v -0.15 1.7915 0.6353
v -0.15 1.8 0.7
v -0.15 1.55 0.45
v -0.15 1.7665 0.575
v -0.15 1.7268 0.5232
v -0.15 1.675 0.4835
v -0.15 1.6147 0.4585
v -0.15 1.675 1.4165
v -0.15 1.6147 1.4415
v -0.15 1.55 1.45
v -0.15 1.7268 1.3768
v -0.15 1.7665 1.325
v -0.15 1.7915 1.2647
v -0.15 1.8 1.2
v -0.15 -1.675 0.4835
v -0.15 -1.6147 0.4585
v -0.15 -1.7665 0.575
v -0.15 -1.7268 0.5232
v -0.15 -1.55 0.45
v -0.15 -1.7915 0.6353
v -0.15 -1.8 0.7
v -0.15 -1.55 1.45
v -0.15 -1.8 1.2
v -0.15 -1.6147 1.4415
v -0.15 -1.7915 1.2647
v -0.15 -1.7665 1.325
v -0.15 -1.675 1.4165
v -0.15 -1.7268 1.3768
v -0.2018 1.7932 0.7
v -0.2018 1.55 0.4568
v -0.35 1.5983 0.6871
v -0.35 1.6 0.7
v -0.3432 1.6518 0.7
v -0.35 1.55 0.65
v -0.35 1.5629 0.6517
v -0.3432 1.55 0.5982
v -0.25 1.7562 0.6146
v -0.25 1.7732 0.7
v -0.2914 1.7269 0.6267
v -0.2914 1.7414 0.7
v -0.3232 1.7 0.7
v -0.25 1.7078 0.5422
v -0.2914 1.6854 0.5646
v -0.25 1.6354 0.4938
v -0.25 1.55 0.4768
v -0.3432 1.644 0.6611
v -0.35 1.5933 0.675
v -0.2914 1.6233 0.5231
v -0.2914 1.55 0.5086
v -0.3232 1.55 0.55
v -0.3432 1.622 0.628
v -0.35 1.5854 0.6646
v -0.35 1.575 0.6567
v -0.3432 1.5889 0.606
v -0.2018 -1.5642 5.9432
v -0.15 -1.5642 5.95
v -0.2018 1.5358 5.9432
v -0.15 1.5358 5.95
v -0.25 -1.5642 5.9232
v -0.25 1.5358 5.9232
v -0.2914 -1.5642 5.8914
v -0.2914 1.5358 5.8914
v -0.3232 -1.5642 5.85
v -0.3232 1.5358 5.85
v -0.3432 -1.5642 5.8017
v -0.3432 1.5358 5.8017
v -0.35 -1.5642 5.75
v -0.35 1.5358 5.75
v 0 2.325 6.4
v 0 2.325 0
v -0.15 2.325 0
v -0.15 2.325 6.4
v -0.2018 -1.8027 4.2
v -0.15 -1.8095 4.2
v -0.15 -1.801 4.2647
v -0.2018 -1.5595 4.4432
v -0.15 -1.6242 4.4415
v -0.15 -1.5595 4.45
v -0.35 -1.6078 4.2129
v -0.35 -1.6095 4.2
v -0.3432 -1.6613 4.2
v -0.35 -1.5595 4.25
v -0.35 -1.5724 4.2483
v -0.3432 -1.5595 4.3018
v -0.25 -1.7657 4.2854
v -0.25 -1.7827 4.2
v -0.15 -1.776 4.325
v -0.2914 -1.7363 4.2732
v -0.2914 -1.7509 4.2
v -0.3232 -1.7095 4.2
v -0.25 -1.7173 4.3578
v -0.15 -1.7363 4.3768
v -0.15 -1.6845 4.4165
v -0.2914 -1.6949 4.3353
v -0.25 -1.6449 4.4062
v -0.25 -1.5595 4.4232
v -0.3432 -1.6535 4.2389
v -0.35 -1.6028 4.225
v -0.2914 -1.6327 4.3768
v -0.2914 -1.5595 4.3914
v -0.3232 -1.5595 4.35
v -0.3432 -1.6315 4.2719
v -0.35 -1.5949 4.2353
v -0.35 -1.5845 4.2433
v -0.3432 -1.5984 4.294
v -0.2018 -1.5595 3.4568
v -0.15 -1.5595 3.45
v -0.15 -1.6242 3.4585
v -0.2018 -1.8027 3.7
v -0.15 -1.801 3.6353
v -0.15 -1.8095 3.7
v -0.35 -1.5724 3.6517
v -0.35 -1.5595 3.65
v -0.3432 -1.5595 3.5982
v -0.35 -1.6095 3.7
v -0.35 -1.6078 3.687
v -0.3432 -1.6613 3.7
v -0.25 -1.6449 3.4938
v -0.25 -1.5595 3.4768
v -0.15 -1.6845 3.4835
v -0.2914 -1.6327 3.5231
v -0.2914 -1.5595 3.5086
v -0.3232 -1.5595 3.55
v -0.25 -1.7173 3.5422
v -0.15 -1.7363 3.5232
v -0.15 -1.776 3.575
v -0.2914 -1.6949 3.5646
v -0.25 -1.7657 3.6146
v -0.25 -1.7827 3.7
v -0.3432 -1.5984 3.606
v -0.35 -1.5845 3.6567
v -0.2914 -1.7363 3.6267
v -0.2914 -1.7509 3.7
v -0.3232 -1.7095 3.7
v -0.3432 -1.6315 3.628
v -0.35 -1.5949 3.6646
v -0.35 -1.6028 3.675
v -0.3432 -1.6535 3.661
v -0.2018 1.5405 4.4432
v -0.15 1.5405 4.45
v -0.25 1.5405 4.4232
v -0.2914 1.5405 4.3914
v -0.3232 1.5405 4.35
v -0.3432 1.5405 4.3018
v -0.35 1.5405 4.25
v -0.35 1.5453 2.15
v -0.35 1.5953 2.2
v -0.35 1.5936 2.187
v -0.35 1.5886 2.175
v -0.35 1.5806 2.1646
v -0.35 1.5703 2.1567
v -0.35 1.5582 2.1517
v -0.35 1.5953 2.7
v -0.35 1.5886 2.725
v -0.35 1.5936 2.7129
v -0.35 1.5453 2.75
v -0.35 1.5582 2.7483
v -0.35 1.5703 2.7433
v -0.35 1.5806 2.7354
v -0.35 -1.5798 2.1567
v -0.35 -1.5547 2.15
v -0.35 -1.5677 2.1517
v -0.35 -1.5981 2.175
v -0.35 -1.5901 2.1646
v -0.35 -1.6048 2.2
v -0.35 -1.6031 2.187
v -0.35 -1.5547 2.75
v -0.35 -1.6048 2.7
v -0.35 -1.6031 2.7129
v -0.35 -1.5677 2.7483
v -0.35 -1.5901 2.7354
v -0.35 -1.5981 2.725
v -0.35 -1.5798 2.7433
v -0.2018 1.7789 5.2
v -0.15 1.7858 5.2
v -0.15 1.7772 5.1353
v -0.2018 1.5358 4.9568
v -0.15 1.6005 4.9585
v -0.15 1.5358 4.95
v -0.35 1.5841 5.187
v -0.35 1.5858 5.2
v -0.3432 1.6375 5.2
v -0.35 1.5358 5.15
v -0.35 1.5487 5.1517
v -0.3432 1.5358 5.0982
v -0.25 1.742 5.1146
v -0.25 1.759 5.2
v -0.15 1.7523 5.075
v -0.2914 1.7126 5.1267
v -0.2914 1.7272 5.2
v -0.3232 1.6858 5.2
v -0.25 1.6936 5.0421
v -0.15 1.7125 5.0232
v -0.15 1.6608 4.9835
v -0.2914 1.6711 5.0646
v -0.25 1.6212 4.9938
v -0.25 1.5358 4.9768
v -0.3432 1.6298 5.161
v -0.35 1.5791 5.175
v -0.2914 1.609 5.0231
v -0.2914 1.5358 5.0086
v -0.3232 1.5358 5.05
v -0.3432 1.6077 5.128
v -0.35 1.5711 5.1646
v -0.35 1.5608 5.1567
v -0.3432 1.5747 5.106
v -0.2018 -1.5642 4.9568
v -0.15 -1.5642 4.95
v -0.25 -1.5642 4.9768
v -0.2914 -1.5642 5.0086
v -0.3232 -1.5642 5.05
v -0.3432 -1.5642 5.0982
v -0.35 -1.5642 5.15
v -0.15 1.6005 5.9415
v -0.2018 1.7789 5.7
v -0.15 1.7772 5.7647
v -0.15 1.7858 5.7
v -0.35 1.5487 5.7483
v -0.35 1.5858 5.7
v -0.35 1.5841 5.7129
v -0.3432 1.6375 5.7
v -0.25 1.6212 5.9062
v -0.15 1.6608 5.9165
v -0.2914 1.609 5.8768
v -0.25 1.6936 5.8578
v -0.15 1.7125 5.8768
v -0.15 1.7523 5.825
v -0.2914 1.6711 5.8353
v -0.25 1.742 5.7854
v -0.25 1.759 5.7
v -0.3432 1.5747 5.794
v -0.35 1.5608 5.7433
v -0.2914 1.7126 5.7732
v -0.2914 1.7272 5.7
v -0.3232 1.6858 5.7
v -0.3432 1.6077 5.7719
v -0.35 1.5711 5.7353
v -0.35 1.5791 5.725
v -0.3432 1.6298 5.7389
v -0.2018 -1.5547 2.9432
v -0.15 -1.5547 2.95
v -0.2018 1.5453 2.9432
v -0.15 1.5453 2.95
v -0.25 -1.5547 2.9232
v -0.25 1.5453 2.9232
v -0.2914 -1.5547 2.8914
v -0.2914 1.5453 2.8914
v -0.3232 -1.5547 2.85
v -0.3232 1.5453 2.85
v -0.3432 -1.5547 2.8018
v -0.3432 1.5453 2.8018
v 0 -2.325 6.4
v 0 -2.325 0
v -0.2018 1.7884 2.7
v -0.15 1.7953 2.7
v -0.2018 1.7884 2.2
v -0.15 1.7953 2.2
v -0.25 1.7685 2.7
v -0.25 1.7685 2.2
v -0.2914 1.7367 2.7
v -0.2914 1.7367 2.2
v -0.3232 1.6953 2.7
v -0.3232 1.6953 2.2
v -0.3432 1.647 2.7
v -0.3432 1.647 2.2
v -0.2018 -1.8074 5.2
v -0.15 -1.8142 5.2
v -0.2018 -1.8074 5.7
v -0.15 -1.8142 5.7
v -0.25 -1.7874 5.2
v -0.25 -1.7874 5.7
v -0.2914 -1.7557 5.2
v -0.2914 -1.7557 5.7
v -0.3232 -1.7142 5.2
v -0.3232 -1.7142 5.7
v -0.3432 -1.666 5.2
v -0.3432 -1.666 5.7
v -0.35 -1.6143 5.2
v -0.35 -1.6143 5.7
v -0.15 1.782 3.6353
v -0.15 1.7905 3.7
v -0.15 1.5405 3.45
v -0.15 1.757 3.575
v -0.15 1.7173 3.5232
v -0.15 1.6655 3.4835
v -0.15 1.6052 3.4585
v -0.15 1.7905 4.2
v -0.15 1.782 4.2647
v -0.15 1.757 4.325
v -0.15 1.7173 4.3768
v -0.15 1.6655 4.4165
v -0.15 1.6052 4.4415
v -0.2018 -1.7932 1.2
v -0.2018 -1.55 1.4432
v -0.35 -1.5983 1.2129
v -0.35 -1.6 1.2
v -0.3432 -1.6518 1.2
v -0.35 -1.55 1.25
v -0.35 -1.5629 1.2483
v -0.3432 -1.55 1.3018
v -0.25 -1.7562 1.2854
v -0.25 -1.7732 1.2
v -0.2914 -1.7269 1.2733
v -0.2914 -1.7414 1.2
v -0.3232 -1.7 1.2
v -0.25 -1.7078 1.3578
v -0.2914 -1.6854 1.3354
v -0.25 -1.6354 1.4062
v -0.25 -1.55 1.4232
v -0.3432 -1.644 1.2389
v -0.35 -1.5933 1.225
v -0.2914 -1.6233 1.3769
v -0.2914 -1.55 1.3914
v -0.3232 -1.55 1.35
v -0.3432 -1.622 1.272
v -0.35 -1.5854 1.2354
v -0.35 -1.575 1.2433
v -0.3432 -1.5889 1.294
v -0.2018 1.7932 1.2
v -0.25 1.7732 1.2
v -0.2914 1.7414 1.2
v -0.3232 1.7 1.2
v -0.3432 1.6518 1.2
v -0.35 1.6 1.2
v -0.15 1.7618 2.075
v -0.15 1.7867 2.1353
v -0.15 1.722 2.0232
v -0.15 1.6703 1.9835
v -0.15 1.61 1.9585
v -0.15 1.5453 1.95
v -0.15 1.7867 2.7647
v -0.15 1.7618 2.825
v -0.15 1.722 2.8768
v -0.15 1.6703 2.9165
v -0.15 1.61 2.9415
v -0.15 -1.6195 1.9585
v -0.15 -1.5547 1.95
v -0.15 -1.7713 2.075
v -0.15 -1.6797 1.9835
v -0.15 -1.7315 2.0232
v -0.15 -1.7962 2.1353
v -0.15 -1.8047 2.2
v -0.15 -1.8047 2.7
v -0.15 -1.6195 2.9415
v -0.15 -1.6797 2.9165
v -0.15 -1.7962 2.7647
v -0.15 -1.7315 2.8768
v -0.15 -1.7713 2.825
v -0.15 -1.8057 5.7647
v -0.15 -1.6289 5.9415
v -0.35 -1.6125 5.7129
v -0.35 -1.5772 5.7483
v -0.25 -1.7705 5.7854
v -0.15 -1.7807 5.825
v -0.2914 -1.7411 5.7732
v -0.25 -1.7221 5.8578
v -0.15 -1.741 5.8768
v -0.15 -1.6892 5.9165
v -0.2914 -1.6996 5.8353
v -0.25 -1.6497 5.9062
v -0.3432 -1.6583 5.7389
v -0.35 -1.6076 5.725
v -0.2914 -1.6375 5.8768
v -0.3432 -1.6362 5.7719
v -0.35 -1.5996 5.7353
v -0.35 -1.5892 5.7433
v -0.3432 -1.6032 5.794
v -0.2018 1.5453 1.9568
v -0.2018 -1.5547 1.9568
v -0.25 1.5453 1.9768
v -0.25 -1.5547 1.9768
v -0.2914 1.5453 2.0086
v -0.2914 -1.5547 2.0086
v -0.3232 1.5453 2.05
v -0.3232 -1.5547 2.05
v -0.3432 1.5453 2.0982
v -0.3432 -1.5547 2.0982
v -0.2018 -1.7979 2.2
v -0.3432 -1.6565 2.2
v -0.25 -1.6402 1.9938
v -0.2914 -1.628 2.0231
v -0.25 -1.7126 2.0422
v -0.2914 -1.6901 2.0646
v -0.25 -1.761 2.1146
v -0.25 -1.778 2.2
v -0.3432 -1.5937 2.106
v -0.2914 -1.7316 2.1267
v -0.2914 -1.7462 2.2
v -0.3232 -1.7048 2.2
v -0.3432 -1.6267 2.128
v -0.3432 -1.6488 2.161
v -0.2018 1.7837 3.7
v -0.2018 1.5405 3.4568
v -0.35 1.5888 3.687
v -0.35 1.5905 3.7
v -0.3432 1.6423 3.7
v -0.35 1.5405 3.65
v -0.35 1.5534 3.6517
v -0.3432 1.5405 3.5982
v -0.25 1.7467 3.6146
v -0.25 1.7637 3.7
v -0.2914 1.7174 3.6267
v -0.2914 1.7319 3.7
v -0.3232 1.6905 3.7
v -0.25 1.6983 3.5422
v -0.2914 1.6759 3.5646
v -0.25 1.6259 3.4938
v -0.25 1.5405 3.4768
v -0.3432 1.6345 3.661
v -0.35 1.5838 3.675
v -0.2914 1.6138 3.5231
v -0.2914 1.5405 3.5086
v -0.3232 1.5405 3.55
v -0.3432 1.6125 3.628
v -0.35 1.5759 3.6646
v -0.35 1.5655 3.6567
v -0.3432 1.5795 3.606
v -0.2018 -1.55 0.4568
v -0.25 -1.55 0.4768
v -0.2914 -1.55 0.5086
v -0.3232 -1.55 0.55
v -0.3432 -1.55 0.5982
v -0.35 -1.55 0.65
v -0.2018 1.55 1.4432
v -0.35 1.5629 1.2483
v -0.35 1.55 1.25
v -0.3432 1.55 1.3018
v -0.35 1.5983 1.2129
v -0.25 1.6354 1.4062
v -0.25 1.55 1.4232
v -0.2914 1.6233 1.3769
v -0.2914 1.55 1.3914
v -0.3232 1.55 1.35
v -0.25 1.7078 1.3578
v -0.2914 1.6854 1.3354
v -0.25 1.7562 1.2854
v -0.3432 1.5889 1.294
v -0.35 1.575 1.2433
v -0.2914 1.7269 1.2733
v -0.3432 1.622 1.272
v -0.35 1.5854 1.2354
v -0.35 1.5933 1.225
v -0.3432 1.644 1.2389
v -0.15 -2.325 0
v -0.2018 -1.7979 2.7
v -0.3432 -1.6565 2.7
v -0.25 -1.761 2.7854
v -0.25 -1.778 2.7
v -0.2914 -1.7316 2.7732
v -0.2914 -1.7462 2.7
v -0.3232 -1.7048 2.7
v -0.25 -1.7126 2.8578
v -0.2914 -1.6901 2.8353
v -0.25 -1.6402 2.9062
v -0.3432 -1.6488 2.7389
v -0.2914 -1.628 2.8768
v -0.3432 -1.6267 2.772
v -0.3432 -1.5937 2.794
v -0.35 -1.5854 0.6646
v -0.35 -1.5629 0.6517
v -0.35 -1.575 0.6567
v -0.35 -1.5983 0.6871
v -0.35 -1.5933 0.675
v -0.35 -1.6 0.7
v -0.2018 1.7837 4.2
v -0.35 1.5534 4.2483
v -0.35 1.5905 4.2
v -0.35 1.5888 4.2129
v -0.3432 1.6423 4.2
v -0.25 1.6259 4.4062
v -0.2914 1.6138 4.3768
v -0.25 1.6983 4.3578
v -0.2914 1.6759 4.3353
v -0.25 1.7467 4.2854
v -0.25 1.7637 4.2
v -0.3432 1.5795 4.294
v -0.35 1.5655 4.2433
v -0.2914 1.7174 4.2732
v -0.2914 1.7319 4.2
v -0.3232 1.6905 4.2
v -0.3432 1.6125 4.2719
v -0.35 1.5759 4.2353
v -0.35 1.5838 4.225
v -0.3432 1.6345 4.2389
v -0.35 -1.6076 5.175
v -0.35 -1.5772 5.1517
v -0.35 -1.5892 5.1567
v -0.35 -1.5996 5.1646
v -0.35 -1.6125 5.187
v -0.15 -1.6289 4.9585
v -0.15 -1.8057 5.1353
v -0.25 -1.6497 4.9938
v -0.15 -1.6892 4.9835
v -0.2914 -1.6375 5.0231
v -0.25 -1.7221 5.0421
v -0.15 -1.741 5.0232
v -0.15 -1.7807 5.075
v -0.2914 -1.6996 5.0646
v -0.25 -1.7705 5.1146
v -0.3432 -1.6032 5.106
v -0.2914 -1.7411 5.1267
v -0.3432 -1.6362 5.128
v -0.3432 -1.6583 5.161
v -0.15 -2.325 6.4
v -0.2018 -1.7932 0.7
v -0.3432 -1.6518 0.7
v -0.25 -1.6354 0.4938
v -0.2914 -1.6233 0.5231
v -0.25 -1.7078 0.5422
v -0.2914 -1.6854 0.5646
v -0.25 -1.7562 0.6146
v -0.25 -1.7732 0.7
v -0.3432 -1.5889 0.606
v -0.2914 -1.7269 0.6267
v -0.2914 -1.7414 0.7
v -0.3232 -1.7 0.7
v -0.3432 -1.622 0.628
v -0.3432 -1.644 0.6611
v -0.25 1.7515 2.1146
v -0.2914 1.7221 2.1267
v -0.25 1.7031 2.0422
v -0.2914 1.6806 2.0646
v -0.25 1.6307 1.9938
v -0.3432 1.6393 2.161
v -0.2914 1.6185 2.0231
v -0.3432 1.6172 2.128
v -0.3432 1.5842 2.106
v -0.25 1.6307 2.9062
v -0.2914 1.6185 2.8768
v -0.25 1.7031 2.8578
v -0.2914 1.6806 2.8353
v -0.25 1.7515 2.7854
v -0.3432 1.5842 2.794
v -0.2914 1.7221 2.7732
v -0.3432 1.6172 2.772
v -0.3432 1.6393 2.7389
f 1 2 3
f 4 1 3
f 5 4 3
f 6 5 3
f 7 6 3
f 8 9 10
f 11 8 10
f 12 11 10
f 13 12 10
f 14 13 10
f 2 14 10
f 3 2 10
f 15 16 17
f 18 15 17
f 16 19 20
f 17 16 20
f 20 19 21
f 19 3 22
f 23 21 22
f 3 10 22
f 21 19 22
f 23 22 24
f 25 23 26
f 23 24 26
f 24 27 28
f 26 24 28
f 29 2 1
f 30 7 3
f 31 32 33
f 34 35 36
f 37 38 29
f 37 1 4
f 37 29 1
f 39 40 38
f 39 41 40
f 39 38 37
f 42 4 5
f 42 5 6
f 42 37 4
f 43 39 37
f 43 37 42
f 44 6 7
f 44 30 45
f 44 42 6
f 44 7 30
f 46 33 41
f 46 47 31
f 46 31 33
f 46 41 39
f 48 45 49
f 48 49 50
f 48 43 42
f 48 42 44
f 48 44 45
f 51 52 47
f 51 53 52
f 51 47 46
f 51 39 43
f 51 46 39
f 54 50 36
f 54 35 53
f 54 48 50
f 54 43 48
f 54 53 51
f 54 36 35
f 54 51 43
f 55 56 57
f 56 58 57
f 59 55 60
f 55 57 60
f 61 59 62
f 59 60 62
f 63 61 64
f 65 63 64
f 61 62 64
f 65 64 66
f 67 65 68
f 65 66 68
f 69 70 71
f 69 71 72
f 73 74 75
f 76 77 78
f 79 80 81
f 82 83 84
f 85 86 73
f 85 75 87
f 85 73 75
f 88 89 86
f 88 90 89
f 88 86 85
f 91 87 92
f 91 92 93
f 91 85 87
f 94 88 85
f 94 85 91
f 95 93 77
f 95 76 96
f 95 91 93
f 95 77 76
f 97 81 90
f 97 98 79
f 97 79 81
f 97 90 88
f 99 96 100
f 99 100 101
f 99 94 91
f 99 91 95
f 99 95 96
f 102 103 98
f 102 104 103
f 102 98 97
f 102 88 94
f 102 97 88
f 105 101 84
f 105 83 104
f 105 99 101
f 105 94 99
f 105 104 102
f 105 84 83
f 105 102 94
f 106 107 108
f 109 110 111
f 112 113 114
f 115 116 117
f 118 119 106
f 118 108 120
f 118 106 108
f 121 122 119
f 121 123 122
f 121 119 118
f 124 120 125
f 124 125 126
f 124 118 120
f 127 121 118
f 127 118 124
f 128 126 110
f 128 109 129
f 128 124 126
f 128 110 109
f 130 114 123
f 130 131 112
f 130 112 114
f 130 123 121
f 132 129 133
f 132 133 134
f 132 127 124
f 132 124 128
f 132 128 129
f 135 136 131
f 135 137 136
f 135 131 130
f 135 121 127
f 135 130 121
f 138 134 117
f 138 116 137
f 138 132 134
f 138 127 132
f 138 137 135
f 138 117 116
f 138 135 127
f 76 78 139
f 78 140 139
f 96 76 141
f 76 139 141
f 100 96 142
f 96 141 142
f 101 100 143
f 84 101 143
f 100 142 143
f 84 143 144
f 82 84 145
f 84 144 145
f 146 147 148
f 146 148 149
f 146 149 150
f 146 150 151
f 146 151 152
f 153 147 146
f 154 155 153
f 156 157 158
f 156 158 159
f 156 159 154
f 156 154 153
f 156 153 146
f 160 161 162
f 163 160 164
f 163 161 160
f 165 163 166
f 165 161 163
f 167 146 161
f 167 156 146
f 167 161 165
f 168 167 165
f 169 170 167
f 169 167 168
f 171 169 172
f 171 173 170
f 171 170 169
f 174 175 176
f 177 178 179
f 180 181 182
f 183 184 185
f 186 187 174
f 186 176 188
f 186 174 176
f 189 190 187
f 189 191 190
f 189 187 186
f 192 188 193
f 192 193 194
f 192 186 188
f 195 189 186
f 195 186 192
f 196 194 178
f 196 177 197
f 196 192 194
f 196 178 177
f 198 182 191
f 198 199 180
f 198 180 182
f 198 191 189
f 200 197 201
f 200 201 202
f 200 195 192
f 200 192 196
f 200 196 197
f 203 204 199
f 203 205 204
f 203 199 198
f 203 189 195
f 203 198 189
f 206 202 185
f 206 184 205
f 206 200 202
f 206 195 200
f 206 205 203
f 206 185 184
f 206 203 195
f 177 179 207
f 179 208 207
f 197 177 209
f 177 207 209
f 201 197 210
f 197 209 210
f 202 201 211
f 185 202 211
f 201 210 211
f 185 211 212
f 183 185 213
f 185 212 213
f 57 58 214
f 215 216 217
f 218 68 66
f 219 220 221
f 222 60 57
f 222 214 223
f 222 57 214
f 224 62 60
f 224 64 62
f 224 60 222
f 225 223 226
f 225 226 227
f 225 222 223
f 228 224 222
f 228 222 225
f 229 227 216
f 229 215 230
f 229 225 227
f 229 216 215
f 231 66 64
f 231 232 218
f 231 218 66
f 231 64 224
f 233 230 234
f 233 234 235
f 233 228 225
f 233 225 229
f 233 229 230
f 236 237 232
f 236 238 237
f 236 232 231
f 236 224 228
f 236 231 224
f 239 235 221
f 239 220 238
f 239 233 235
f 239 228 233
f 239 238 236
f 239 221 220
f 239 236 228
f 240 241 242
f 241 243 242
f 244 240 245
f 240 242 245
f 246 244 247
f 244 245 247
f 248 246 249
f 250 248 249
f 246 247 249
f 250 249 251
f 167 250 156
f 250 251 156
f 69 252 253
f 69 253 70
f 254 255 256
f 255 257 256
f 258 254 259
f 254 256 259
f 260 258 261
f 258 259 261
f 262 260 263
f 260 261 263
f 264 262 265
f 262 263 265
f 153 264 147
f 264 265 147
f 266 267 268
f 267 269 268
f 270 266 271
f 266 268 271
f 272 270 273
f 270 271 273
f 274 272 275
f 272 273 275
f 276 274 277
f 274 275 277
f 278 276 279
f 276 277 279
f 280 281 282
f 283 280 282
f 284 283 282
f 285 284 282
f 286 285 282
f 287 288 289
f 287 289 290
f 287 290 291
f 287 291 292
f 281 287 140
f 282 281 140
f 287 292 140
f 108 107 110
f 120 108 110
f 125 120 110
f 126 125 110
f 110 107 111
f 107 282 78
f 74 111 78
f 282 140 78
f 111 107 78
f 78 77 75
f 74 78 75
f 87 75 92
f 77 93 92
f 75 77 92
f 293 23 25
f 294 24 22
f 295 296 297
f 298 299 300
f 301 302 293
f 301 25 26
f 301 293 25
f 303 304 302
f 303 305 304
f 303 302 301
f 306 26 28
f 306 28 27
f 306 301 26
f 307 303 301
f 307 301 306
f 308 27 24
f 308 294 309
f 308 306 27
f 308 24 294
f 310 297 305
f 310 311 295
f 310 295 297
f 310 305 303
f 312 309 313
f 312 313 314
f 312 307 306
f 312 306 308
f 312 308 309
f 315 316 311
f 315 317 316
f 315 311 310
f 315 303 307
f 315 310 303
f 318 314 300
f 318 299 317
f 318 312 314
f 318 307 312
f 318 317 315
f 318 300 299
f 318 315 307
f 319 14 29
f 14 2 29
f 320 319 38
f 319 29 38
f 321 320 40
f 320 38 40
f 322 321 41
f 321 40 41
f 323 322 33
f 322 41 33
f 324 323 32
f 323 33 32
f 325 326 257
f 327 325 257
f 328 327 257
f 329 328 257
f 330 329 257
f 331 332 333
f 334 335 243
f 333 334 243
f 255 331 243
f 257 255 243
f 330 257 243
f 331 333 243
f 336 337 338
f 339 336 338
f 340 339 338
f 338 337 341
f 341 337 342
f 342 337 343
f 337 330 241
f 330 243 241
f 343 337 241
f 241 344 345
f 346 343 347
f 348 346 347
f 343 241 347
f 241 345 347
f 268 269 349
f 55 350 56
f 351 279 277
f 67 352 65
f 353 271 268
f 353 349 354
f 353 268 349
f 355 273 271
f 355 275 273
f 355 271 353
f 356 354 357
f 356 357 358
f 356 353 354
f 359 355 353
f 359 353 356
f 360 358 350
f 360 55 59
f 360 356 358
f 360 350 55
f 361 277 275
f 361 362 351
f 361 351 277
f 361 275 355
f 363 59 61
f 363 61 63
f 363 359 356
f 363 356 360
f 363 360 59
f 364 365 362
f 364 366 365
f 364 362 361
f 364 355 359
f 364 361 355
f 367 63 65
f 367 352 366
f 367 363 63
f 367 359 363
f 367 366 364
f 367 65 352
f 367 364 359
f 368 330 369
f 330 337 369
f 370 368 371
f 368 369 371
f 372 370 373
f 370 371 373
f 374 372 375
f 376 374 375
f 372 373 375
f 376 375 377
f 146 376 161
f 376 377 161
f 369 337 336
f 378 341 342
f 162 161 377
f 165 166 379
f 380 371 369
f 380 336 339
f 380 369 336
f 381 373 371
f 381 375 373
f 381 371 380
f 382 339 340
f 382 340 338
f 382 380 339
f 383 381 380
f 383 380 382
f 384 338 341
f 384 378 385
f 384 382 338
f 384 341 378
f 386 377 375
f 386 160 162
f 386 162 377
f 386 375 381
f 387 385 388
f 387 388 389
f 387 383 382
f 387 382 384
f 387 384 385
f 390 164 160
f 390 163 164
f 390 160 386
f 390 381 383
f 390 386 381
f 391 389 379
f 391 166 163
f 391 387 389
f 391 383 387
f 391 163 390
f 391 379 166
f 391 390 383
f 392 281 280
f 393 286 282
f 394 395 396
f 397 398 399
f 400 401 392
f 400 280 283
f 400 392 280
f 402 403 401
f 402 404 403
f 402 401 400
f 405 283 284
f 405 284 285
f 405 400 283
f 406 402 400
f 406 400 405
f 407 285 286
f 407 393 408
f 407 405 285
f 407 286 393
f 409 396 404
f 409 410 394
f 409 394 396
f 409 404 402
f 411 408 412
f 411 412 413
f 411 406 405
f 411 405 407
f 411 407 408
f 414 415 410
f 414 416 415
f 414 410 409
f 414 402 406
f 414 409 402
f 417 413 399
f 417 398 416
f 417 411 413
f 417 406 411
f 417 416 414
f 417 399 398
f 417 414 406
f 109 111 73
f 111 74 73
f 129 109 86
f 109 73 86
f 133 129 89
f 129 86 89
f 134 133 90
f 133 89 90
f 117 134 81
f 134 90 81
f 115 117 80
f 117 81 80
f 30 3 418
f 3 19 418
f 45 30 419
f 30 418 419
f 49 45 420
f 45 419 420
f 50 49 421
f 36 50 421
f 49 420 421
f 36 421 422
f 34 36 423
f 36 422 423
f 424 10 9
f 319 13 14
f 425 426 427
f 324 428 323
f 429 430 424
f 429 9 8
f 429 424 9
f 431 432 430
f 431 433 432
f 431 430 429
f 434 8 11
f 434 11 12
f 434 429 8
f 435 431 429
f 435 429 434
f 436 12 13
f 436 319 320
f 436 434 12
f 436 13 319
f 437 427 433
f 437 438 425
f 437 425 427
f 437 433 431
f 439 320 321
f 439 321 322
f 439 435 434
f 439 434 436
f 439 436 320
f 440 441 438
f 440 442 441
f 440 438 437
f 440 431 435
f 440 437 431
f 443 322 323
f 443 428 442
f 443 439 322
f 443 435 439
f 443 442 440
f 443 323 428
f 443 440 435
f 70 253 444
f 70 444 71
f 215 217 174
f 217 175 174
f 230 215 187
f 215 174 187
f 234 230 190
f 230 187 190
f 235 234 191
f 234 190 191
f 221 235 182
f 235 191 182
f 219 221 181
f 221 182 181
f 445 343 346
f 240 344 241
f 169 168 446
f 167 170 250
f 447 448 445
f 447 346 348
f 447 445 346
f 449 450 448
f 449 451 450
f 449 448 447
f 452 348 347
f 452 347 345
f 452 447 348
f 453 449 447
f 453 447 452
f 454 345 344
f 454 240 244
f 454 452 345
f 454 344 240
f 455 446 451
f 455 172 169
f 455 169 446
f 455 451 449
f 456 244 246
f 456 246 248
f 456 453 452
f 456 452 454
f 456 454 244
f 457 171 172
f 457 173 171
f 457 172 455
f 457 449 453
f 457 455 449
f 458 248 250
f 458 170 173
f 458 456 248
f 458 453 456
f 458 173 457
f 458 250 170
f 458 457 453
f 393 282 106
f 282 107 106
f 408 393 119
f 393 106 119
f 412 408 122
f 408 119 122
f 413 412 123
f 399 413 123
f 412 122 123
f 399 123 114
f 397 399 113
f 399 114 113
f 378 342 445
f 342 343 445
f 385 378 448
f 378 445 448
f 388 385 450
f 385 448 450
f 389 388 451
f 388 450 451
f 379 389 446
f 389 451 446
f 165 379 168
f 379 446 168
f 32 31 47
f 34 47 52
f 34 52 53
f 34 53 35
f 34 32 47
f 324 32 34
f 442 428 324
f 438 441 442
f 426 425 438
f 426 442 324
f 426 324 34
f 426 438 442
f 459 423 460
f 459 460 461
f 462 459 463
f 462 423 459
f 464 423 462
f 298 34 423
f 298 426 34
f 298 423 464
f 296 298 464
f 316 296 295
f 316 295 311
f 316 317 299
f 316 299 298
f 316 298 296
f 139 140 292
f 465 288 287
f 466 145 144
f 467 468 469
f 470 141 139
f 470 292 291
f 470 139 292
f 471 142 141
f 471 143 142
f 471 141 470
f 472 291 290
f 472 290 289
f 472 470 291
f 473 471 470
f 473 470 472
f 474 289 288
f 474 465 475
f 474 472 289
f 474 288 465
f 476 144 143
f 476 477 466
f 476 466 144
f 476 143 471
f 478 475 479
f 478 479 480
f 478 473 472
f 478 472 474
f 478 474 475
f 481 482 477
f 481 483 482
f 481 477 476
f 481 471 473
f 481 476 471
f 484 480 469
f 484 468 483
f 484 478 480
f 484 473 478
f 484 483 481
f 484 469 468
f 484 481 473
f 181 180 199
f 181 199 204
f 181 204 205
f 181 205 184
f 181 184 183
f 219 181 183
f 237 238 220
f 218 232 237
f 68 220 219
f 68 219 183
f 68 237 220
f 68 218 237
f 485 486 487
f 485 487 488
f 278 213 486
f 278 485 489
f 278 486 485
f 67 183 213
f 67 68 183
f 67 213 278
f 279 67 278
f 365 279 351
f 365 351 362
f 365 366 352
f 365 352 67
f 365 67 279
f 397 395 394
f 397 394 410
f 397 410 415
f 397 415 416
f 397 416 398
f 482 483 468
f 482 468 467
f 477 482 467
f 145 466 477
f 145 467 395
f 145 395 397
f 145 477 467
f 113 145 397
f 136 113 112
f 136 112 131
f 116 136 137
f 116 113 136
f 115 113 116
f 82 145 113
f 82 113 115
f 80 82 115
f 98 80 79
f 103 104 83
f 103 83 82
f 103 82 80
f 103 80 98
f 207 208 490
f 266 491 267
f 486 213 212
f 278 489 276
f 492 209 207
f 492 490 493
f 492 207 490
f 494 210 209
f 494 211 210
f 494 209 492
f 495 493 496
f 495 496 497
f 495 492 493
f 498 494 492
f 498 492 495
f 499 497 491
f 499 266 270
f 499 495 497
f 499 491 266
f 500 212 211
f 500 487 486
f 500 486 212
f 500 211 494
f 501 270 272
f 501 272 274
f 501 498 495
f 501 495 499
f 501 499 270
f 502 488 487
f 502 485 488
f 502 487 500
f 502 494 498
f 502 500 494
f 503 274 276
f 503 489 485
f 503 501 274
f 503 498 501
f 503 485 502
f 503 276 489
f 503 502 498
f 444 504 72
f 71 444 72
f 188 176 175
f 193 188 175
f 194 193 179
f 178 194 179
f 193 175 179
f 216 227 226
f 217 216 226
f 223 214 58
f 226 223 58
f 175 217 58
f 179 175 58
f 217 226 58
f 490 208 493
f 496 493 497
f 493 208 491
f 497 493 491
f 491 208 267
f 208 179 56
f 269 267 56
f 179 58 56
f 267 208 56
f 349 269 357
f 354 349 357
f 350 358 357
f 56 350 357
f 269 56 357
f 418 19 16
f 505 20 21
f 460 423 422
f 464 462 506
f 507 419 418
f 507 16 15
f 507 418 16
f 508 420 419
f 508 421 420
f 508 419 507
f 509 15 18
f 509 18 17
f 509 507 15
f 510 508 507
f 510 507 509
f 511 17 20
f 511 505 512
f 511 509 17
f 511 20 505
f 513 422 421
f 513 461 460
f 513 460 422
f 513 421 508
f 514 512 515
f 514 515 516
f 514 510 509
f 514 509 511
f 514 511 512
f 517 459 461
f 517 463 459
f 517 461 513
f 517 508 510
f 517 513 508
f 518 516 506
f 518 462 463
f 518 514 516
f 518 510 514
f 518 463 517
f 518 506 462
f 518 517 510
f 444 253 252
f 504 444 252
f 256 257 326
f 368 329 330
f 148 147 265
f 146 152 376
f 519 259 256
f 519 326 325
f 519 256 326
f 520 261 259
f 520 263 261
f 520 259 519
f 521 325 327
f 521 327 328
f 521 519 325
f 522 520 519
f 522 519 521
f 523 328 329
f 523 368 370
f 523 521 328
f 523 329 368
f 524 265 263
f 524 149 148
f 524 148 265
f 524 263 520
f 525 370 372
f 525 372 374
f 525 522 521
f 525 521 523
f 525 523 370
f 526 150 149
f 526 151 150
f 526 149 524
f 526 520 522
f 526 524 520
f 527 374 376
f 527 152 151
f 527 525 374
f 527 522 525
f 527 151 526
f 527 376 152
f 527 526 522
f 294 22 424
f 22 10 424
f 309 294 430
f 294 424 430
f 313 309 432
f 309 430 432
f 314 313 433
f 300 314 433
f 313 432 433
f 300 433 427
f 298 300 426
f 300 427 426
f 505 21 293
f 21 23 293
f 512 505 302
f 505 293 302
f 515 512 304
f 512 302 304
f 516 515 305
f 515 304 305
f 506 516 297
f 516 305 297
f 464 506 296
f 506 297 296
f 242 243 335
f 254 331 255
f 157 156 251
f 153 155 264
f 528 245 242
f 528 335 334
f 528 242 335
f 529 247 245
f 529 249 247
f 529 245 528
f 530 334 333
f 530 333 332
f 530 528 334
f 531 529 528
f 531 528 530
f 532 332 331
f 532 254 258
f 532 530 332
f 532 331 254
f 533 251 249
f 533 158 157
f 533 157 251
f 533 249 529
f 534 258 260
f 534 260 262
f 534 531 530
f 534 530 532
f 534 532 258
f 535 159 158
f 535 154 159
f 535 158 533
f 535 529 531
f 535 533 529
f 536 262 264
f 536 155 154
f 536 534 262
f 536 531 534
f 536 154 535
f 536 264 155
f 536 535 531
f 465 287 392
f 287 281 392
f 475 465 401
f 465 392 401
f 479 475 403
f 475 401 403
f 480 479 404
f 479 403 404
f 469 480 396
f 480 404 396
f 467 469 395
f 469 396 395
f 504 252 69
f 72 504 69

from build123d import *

# Parameters (mm, degrees)
F0_W     = 4.65
F0_H     = 6.4
F1_DEPTH = 0.15
F3_DEPTH = 0.2
F4_R     = 0.19999
F4_2_R   = 0.19999
F4_3_R   = 0.19999
F4_4_R   = 0.19999


# Not quite as in the source:
# - a fillet or chamfer is up to 0.001 mm smaller than in the source, because OpenCascade refuses the exact size


with BuildPart() as f1:
    # F0 (on Right) → F1 (new body)
    with BuildSketch(Plane.YZ):
        with Locations((0, 3.2)):
            Rectangle(F0_W, F0_H)
    extrude(amount=-F1_DEPTH)


with BuildPart() as f3:
    # F2 (on face) → F3 (new body)
    with BuildSketch(Plane(origin=(-0.15, 0, 0), x_dir=(0, -1, 0), z_dir=(-1, 0, 0))):
        with BuildLine():
            Line((-1.55, 0.45), (1.55, 0.45))
            ThreePointArc((1.55, 0.45), (1.7267766953, 0.5232233047), (1.8, 0.7))
            Line((1.8, 0.7), (1.8, 1.2))
            ThreePointArc((1.8, 1.2), (1.7267766953, 1.3767766953), (1.55, 1.45))
            Line((1.55, 1.45), (-1.55, 1.45))
            ThreePointArc((-1.55, 1.45), (-1.7267766953, 1.3767766953), (-1.8, 1.2))
            Line((-1.8, 1.2), (-1.8, 0.7))
            ThreePointArc((-1.8, 0.7), (-1.7267766953, 0.5232233047), (-1.55, 0.45))
        make_face()
    extrude(amount=F3_DEPTH)

    # F4#4 (radius 0.2 in the source; OpenCascade refuses exactly that, so slightly less here)
    f4_4_edges = [f3.edges().sort_by_distance(p)[0] for p in [
        (-0.35, 0, 0.45),
        (-0.35, -1.726777, 0.523223),
        (-0.35, -1.8, 0.95),
        (-0.35, -1.726777, 1.376777),
        (-0.35, 0, 1.45),
        (-0.35, 1.726777, 1.376777),
        (-0.35, 1.8, 0.95),
        (-0.35, 1.726777, 0.523223),
    ]]
    fillet(f4_4_edges, radius=F4_4_R)


with BuildPart() as f3b:
    # F2 (on face) → F3, piece 2 (new body)
    with BuildSketch(Plane(origin=(-0.15, 0, 0), x_dir=(0, -1, 0), z_dir=(-1, 0, 0))):
        with BuildLine():
            Line((-1.5452531883, 1.9499924892), (1.5547468117, 1.9499924892))
            ThreePointArc((1.5547468117, 1.9499924892), (1.731523507, 2.0232157939), (1.8047468117, 2.1999924892))
            Line((1.8047468117, 2.1999924892), (1.8047468117, 2.6999924892))
            ThreePointArc((1.8047468117, 2.6999924892), (1.731523507, 2.8767691845), (1.5547468117, 2.9499924892))
            Line((1.5547468117, 2.9499924892), (-1.5452531883, 2.9499924892))
            ThreePointArc((-1.5452531883, 2.9499924892), (-1.7220298836, 2.8767691845), (-1.7952531883, 2.6999924892))
            Line((-1.7952531883, 2.6999924892), (-1.7952531883, 2.1999924892))
            ThreePointArc((-1.7952531883, 2.1999924892), (-1.7220298836, 2.0232157939), (-1.5452531883, 1.9499924892))
        make_face()
    extrude(amount=F3_DEPTH)

    # F4#3 (radius 0.2 in the source; OpenCascade refuses exactly that, so slightly less here)
    f4_3_edges = [f3b.edges().sort_by_distance(p)[0] for p in [
        (-0.35, 1.72203, 2.023216),
        (-0.35, -0.004747, 1.949992),
        (-0.35, -1.731524, 2.023216),
        (-0.35, -1.804747, 2.449992),
        (-0.35, -1.731524, 2.876769),
        (-0.35, -0.004747, 2.949992),
        (-0.35, 1.72203, 2.876769),
        (-0.35, 1.795253, 2.449992),
    ]]
    fillet(f4_3_edges, radius=F4_3_R)


with BuildPart() as f3c:
    # F2 (on face) → F3, piece 3 (new body)
    with BuildSketch(Plane(origin=(-0.15, 0, 0), x_dir=(0, -1, 0), z_dir=(-1, 0, 0))):
        with BuildLine():
            Line((-1.5405063767, 3.4499849785), (1.5594936233, 3.4499849785))
            ThreePointArc((1.5594936233, 3.4499849785), (1.7362703186, 3.5232082832), (1.8094936233, 3.6999849785))
            Line((1.8094936233, 3.6999849785), (1.8094936233, 4.1999849785))
            ThreePointArc((1.8094936233, 4.1999849785), (1.7362703186, 4.3767616738), (1.5594936233, 4.4499849785))
            Line((1.5594936233, 4.4499849785), (-1.5405063767, 4.4499849785))
            ThreePointArc((-1.5405063767, 4.4499849785), (-1.7172830719, 4.3767616738), (-1.7905063767, 4.1999849785))
            Line((-1.7905063767, 4.1999849785), (-1.7905063767, 3.6999849785))
            ThreePointArc((-1.7905063767, 3.6999849785), (-1.7172830719, 3.5232082832), (-1.5405063767, 3.4499849785))
        make_face()
    extrude(amount=F3_DEPTH)

    # F4#2 (radius 0.2 in the source; OpenCascade refuses exactly that, so slightly less here)
    f4_2_edges = [f3c.edges().sort_by_distance(p)[0] for p in [
        (-0.35, 1.717283, 3.523208),
        (-0.35, -0.009494, 3.449985),
        (-0.35, -1.73627, 3.523208),
        (-0.35, -1.809494, 3.949985),
        (-0.35, -1.73627, 4.376762),
        (-0.35, -0.009494, 4.449985),
        (-0.35, 1.717283, 4.376762),
        (-0.35, 1.790506, 3.949985),
    ]]
    fillet(f4_2_edges, radius=F4_2_R)


with BuildPart() as f3d:
    # F2 (on face) → F3, piece 4 (new body)
    with BuildSketch(Plane(origin=(-0.15, 0, 0), x_dir=(0, -1, 0), z_dir=(-1, 0, 0))):
        with BuildLine():
            Line((-1.535759565, 4.9499774677), (1.564240435, 4.9499774677))
            ThreePointArc((1.564240435, 4.9499774677), (1.7410171303, 5.0232007724), (1.814240435, 5.1999774677))
            Line((1.814240435, 5.1999774677), (1.814240435, 5.6999774677))
            ThreePointArc((1.814240435, 5.6999774677), (1.7410171303, 5.876754163), (1.564240435, 5.9499774677))
            Line((1.564240435, 5.9499774677), (-1.535759565, 5.9499774677))
            ThreePointArc((-1.535759565, 5.9499774677), (-1.7125362603, 5.876754163), (-1.785759565, 5.6999774677))
            Line((-1.785759565, 5.6999774677), (-1.785759565, 5.1999774677))
            ThreePointArc((-1.785759565, 5.1999774677), (-1.7125362603, 5.0232007724), (-1.535759565, 4.9499774677))
        make_face()
    extrude(amount=F3_DEPTH)

    # F4 (radius 0.2 in the source; OpenCascade refuses exactly that, so slightly less here)
    f4_edges = [f3d.edges().sort_by_distance(p)[0] for p in [
        (-0.35, 1.712536, 5.023201),
        (-0.35, -0.01424, 4.949977),
        (-0.35, -1.741017, 5.023201),
        (-0.35, -1.81424, 5.449977),
        (-0.35, -1.741017, 5.876754),
        (-0.35, -0.01424, 5.949977),
        (-0.35, 1.712536, 5.876754),
        (-0.35, 1.78576, 5.449977),
    ]]
    fillet(f4_edges, radius=F4_R)


solid = Compound([f1.part, f3.part, f3b.part, f3c.part, f3d.part])
